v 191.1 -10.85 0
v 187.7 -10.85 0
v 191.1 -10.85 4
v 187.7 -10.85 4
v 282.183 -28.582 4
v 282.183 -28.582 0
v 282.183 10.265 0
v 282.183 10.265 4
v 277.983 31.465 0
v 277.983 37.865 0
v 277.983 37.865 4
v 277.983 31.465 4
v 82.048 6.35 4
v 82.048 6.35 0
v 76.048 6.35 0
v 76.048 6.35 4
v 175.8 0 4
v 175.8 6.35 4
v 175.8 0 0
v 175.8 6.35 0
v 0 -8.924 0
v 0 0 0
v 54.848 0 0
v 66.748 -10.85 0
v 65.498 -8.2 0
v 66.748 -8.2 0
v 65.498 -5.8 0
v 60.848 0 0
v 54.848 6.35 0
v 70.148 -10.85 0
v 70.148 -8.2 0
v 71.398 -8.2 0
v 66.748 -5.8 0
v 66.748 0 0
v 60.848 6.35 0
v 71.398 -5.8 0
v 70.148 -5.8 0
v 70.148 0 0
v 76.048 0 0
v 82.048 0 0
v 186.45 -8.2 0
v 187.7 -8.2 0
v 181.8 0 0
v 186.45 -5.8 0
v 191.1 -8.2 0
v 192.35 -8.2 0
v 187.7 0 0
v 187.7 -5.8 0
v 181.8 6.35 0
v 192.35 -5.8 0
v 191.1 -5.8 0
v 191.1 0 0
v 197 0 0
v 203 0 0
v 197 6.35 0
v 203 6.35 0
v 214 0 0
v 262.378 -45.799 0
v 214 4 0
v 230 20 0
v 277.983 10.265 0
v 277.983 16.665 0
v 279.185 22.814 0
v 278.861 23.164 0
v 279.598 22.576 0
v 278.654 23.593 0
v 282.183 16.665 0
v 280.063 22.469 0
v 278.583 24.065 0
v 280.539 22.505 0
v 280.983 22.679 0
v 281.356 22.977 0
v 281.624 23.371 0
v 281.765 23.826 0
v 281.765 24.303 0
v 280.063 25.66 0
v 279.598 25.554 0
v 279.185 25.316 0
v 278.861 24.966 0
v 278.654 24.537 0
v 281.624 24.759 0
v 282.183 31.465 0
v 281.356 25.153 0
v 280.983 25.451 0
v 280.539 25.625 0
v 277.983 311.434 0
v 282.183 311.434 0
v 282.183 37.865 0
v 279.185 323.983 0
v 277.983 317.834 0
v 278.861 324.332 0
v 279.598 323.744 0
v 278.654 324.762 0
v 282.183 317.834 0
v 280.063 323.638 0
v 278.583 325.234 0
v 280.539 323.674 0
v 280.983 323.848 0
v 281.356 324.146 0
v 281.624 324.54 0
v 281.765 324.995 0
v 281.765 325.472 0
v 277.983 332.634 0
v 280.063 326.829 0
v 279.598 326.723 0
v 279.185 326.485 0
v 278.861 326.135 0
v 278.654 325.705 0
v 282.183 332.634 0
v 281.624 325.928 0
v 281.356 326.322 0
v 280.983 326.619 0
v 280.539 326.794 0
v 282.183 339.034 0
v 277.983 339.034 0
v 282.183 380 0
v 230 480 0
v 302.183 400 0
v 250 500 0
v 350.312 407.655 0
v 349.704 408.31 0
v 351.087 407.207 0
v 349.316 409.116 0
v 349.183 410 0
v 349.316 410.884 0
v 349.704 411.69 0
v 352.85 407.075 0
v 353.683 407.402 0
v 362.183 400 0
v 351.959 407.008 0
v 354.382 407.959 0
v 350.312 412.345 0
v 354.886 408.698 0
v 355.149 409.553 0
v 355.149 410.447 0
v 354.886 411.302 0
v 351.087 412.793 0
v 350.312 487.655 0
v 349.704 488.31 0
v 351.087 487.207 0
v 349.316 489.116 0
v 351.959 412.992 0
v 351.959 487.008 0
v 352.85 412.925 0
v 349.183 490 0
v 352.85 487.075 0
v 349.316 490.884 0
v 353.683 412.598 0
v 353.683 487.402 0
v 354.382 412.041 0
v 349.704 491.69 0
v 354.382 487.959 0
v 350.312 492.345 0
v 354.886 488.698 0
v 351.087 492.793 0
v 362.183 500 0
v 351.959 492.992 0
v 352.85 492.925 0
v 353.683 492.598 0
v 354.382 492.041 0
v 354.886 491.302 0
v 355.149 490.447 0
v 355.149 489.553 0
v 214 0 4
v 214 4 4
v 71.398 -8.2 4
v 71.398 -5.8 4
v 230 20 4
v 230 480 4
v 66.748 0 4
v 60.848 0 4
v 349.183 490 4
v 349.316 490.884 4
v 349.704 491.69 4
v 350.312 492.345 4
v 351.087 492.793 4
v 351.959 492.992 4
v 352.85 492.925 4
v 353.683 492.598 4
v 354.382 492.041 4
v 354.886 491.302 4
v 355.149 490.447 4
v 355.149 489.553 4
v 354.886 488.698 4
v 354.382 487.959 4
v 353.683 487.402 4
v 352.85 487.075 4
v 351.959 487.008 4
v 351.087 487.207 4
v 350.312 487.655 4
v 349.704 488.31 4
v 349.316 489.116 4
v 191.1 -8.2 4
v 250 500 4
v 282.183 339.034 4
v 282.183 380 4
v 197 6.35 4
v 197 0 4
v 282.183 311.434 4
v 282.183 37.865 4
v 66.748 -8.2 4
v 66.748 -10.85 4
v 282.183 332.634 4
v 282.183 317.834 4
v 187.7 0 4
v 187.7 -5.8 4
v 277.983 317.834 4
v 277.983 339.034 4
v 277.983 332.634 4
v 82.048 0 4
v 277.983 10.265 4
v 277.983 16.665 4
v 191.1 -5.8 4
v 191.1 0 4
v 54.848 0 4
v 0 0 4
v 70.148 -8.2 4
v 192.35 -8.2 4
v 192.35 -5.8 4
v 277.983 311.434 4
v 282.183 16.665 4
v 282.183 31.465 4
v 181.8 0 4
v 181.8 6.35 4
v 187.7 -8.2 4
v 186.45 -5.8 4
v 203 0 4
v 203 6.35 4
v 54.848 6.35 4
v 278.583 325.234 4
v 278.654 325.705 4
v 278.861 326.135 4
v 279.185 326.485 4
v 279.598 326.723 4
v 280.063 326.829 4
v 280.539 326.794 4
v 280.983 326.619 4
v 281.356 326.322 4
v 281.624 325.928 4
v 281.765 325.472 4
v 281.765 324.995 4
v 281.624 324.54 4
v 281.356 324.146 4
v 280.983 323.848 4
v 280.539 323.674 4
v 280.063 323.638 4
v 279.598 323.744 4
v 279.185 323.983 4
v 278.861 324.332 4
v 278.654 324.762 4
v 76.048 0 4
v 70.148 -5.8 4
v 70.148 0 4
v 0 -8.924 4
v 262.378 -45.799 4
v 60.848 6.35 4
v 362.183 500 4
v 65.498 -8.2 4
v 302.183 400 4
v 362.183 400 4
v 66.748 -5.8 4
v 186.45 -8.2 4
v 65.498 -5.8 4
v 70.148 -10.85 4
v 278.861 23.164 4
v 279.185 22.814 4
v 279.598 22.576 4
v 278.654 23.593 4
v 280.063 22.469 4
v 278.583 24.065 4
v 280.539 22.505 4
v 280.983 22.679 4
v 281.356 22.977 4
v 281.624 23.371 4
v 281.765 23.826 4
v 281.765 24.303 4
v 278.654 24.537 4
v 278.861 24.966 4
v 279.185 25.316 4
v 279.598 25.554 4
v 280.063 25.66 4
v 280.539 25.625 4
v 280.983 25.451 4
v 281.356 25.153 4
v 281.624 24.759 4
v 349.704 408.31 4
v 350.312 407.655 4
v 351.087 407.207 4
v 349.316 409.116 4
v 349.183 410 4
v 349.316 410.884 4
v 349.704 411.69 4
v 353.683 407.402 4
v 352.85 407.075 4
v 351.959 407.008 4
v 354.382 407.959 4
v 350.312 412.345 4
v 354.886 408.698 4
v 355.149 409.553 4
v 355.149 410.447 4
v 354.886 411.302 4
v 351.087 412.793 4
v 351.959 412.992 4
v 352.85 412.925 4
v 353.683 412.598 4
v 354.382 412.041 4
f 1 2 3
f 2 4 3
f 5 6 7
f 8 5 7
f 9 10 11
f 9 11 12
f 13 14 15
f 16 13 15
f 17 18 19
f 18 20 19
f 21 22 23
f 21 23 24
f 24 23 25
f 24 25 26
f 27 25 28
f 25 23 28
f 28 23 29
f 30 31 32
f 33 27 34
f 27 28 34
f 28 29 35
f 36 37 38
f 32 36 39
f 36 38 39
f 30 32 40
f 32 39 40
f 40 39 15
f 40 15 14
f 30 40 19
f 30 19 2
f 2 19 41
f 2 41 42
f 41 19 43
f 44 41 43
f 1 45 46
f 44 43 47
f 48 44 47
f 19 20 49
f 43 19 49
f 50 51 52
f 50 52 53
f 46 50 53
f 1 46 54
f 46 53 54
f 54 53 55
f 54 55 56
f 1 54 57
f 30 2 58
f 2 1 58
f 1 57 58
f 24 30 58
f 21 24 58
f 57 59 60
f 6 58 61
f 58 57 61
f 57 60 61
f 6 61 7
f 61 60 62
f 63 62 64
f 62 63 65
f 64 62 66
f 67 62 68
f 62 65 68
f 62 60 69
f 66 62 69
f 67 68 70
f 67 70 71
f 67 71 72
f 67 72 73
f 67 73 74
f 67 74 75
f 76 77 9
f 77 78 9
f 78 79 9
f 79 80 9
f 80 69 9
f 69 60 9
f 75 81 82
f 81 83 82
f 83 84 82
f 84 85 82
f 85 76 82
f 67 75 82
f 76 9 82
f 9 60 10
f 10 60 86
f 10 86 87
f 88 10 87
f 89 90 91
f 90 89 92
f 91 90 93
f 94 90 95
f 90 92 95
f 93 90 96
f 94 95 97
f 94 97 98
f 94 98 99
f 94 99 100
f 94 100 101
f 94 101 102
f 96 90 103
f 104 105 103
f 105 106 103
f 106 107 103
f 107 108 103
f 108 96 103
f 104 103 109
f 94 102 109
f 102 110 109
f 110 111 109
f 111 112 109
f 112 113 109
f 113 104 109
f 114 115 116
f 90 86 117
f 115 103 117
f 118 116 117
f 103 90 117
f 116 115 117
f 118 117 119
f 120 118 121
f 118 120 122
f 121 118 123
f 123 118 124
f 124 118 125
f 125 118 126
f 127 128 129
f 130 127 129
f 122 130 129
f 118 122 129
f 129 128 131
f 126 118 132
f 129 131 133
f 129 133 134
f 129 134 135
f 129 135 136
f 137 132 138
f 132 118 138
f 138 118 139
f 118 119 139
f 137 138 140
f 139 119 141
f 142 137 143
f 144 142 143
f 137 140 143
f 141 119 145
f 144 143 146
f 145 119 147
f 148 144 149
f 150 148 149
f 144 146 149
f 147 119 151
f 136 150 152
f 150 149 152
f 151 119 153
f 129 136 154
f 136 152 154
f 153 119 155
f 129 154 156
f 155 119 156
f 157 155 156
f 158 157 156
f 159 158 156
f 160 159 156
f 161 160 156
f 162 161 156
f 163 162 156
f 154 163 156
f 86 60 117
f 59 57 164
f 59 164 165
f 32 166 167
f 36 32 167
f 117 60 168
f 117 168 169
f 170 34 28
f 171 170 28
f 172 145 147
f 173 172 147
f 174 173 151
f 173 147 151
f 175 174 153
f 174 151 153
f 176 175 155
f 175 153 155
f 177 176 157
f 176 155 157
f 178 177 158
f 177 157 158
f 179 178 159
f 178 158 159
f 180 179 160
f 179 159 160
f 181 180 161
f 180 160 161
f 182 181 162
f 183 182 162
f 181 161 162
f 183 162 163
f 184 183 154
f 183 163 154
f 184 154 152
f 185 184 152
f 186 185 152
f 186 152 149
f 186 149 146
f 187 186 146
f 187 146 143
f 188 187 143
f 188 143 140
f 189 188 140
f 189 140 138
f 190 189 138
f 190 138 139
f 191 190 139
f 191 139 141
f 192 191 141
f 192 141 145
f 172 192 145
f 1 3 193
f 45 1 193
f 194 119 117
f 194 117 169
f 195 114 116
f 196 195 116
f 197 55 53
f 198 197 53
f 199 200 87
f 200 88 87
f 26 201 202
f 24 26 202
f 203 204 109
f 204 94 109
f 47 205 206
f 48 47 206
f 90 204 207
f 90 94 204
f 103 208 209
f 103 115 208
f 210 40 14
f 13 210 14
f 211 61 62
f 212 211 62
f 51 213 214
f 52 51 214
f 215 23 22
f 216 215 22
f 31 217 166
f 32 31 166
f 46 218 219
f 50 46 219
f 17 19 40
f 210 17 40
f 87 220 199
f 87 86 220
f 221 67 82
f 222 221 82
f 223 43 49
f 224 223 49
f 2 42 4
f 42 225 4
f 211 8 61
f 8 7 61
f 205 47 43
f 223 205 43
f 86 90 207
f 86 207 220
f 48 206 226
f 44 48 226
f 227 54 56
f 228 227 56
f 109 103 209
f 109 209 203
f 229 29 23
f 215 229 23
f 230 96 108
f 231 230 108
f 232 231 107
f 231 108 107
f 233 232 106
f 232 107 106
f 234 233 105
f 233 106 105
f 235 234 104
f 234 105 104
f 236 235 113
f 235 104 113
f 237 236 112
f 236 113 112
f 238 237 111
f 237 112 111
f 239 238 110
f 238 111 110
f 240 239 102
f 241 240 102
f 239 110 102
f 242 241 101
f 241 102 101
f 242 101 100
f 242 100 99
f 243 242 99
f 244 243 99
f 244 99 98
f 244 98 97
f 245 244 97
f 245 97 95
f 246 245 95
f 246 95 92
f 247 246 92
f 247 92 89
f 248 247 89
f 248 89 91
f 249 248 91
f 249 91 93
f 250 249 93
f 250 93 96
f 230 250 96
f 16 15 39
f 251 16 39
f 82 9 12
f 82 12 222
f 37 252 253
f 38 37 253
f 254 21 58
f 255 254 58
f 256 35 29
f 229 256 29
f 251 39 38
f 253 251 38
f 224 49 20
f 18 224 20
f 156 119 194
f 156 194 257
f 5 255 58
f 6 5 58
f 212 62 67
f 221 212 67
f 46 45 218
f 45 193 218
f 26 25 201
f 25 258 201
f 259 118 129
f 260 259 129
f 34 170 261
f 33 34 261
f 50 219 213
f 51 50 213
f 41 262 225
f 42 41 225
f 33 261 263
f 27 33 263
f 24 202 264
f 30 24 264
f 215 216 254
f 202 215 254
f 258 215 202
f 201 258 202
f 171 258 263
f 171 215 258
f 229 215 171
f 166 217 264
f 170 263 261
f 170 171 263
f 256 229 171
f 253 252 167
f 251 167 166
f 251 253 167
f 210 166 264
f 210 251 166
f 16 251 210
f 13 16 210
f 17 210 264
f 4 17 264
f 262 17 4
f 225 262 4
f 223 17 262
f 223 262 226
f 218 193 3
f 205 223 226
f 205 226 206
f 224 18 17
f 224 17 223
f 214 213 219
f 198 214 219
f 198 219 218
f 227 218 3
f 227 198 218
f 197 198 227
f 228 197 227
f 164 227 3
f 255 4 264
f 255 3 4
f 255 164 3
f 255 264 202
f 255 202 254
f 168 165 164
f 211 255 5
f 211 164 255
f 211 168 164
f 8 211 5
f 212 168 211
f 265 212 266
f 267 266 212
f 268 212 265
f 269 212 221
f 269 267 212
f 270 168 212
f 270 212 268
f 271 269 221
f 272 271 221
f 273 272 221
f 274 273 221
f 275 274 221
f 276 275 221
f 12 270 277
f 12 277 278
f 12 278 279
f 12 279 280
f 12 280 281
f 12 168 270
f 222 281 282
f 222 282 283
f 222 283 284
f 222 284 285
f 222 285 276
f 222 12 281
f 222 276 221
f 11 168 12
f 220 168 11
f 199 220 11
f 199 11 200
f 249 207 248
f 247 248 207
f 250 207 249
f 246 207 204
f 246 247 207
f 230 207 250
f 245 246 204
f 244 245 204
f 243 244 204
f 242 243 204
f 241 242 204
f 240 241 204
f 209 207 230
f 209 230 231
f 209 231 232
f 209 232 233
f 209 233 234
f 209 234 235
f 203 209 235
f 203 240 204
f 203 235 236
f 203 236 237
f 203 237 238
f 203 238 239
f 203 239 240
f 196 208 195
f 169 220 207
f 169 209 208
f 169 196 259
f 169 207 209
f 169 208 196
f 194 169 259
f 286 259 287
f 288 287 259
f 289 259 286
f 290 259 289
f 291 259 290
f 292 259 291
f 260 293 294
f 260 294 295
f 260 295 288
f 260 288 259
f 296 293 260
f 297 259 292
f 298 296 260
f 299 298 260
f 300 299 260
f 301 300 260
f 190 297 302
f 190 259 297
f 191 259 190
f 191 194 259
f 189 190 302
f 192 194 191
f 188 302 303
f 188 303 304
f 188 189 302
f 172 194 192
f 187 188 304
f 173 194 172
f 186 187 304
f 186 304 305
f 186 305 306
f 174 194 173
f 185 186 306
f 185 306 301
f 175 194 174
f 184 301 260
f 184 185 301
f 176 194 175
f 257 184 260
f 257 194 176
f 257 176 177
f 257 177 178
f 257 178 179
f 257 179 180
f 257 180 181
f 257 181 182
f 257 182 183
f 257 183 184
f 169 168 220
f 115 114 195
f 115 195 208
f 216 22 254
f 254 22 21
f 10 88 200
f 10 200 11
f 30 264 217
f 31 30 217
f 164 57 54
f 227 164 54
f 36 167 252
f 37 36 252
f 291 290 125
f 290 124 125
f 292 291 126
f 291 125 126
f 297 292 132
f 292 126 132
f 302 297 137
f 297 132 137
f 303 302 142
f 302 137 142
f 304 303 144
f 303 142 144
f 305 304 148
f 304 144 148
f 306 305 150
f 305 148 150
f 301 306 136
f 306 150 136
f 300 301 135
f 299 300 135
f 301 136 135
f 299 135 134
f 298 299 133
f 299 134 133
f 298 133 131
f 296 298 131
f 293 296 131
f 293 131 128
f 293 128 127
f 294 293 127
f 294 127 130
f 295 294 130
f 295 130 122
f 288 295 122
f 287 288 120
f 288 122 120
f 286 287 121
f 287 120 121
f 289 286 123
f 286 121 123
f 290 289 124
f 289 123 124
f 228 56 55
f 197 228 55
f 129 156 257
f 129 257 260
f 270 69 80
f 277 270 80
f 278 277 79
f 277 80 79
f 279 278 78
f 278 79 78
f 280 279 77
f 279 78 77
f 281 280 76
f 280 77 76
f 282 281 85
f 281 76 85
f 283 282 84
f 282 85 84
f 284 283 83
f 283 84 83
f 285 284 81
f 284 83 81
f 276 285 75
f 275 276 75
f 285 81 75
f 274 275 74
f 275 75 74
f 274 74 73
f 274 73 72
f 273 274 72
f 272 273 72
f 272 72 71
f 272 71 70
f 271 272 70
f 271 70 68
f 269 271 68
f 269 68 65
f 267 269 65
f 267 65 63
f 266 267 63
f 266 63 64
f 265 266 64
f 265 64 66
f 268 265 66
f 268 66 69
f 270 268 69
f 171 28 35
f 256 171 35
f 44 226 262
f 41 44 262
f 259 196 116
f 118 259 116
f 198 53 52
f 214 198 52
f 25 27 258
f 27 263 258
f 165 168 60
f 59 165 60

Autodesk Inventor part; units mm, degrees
ref_plane "YZ Plane" through (0, 0, 0) normal (1, 0, 0) x (0, 1, 0)
ref_plane "XZ Plane" through (0, 0, 0) normal (0, 1, 0) x (-1, 0, 0)
ref_plane "XY Plane" through (0, 0, 0) normal (0, 0, 1) x (1, 0, 0)
sketch "Sketch1" plane through (0, 0, 0) normal (0, 0, 1) x (1, 0, 0)
  line L0 (230, 0) -> (0, 0) projected
  line L1 (0, 0) -> (0, -8.9243)
  line L2 (0, -8.9243) -> (282.1829, -48.5825)
  line L3 (282.1829, -48.5825) -> (282.1829, 400)
  line L4 (230, 0) -> (230, 500)
  line L5 (282.1829, 400) -> (362.1829, 400)
  line L6 (230, 500) -> (362.1829, 500)
  line L7 (362.1829, 500) -> (362.1829, 400)
  dimension "d0" = 400
  dimension "d1" = 8
  dimension "d10" = 80
  dimension "d11" = 100
extrude "Extrusion1" add sketch "Sketch1" along normal blind 4
chamfer "Chamfer1" distance 20 angle 45 2 edges at (230, 500, 2) (282.1829, 400, 2)
chamfer "Chamfer2" distance 20 angle 45 2 edges at (230, 0, 2) (282.1829, -48.5825, 2)
sketch "Sketch2" plane through (0, 0, 0) normal (0, 0, -1) x (-1, 0, 0)
  point P0 (0, 0)
sketch "Sketch3" plane through (0, 0, 0) normal (0, 0, -1) x (-1, 0, 0)
  point P0 (0, 0)
sketch "Sketch4" plane through (0, 0, 0) normal (0, 0, -1) x (-1, 0, 0)
  point P0 (0, 0)
sketch "Sketch5" plane through (0, 0, 0) normal (0, 0, -1) x (-1, 0, 0)
  line L0 (-278.1829, 10.465) -> (-278.1829, 16.465) construction
  line L1 (-282.1829, 16.465) -> (-278.1829, 16.465) construction
  line L2 (-282.1829, 10.465) -> (-282.1829, 16.465) construction
  line L3 (-282.1829, 10.465) -> (-278.1829, 10.465) construction
  line L4 (-278.1829, 31.665) -> (-278.1829, 37.665) construction
  line L5 (-282.1829, 37.665) -> (-278.1829, 37.665) construction
  line L6 (-282.1829, 31.665) -> (-282.1829, 37.665) construction
  line L7 (-282.1829, 31.665) -> (-278.1829, 31.665) construction
  line L8 (-278.1829, 332.8339) -> (-278.1829, 338.8339) construction
  line L9 (-282.1829, 338.8339) -> (-278.1829, 338.8339) construction
  line L10 (-282.1829, 332.8339) -> (-282.1829, 338.8339) construction
  line L11 (-282.1829, 332.8339) -> (-278.1829, 332.8339) construction
  line L12 (-278.1829, 311.6339) -> (-278.1829, 317.6339) construction
  line L13 (-282.1829, 317.6339) -> (-278.1829, 317.6339) construction
  line L14 (-282.1829, 311.6339) -> (-282.1829, 317.6339) construction
  line L15 (-282.1829, 311.6339) -> (-278.1829, 311.6339) construction
  line L16 (-277.9829, 339.0339) -> (-277.9829, 332.6339)
  line L17 (-277.9829, 332.6339) -> (-282.3829, 332.6339)
  line L18 (-282.3829, 332.6339) -> (-282.3829, 339.0339)
  line L19 (-282.3829, 339.0339) -> (-277.9829, 339.0339)
  line L20 (-277.9829, 317.8339) -> (-277.9829, 311.4339)
  line L21 (-277.9829, 311.4339) -> (-282.3829, 311.4339)
  line L22 (-282.3829, 311.4339) -> (-282.3829, 317.8339)
  line L23 (-282.3829, 317.8339) -> (-277.9829, 317.8339)
  line L24 (-277.9829, 37.865) -> (-277.9829, 31.465)
  line L25 (-277.9829, 31.465) -> (-282.3829, 31.465)
  line L26 (-282.3829, 31.465) -> (-282.3829, 37.865)
  line L27 (-282.3829, 37.865) -> (-277.9829, 37.865)
  line L28 (-277.9829, 10.265) -> (-277.9829, 16.665)
  line L29 (-277.9829, 16.665) -> (-282.3829, 16.665)
  line L30 (-282.3829, 16.665) -> (-282.3829, 10.265)
  line L31 (-282.3829, 10.265) -> (-277.9829, 10.265)
  point P0 (0, 0)
  dimension "d24" = 0.2
  dimension "d25" = 0.2
  dimension "d26" = 0.2
  dimension "d27" = 0.2
extrude "Extrusion2" cut sketch "Sketch5" against normal blind 25.4
sketch "Sketch6" plane through (0, 0, 0) normal (0, 0, -1) x (-1, 0, 0)
  line L0 (-278.1829, 25.5649) -> (-278.1829, 22.5649) projected
  line L1 (-282.1829, 25.5649) -> (-278.1829, 25.5649) projected
  line L2 (-282.1829, 22.5649) -> (-282.1829, 25.5649) projected
  line L3 (-282.1829, 22.5649) -> (-278.1829, 22.5649) projected
  line L4 (-278.1829, 326.7338) -> (-278.1829, 323.7338) projected
  line L5 (-282.1829, 326.7338) -> (-278.1829, 326.7338) projected
  line L6 (-282.1829, 323.7338) -> (-282.1829, 326.7338) projected
  line L7 (-282.1829, 323.7338) -> (-278.1829, 323.7338) projected
  circle A0 centre (-280.1829, 325.2338) radius 1.6
  circle A1 centre (-280.1829, 24.0649) radius 1.6
  point P0 (0, 0)
  dimension "d14" = 3.2
  dimension "d15" = 3.2
extrude "Extrusion3" cut sketch "Sketch6" against normal through all contours A1 L3 L1 | L1 A1 | A1 L3 | A0 L7 L5 | L5 A0 | A0 L7
sketch "Sketch7" plane through (0, 0, 0) normal (0, 0, -1) x (-1, 0, 0)
  line L0 (-230, 4.0001) -> (-214.0001, 4.0001) projected
  line L1 (-210, 0) -> (-230, 20) projected
  line L2 (-210, 0) -> (-214.0001, 0)
  line L3 (-214.0001, 0) -> (-214.0001, 4.0001)
  line L4 (-214.0001, 4.0001) -> (-210, 4.0001)
  line L5 (-210, 4.0001) -> (-210, 0)
  point P0 (0, 0)
extrude "Extrusion4" cut sketch "Sketch7" against normal blind 25.4
sketch "Sketch8" plane through (0, 0, 0) normal (0, 0, -1) x (-1, 0, 0)
  line L0 (-209.8759, -14.6536) -> (-209.8759, 0) projected
  line L1 (-168.9242, -14.6536) -> (-209.8759, -14.6536) projected
  line L2 (-168.9242, 0) -> (-168.9242, -14.6536) projected
  line L3 (-175.8001, 0) -> (-168.9242, 0) projected
  line L4 (-175.8001, 6.35) -> (-175.8001, 0) projected
  line L5 (-181.8001, 6.35) -> (-175.8001, 6.35) projected
  line L6 (-181.8001, 0) -> (-181.8001, 6.35) projected
  line L7 (-187.9001, 0) -> (-181.8001, 0) projected
  line L8 (-187.9001, -6) -> (-187.9001, 0) projected
  line L9 (-186.6501, -6) -> (-187.9001, -6) projected
  line L10 (-186.6501, -8) -> (-186.6501, -6) projected
  line L11 (-187.9001, -8) -> (-186.6501, -8) projected
  line L12 (-187.9001, -10.65) -> (-187.9001, -8) projected
  line L13 (-190.9, -10.65) -> (-187.9001, -10.65) projected
  line L14 (-190.9, -8) -> (-190.9, -10.65) projected
  line L15 (-192.15, -8) -> (-190.9, -8) projected
  line L16 (-192.15, -6) -> (-192.15, -8) projected
  line L17 (-190.9, -6) -> (-192.15, -6) projected
  line L18 (-190.9, 0) -> (-190.9, -6) projected
  line L19 (-197, 0) -> (-190.9, 0) projected
  line L20 (-197, 6.35) -> (-197, 0) projected
  line L21 (-203.0001, 6.35) -> (-197, 6.35) projected
  line L22 (-203.0001, 0) -> (-203.0001, 6.35) projected
  line L23 (-209.8759, 0) -> (-203.0001, 0) projected
  line L24 (-88.9242, -14.6536) -> (-88.9242, 0) projected
  line L25 (-47.9725, -14.6536) -> (-88.9242, -14.6536) projected
  line L26 (-47.9725, 0) -> (-47.9725, -14.6536) projected
  line L27 (-54.8484, 0) -> (-47.9725, 0) projected
  line L28 (-54.8484, 6.35) -> (-54.8484, 0) projected
  line L29 (-60.8484, 6.35) -> (-54.8484, 6.35) projected
  line L30 (-60.8484, 0) -> (-60.8484, 6.35) projected
  line L31 (-66.9484, 0) -> (-60.8484, 0) projected
  line L32 (-66.9484, -6) -> (-66.9484, 0) projected
  line L33 (-65.6984, -6) -> (-66.9484, -6) projected
  line L34 (-65.6984, -8) -> (-65.6984, -6) projected
  line L35 (-66.9484, -8) -> (-65.6984, -8) projected
  line L36 (-66.9484, -10.65) -> (-66.9484, -8) projected
  line L37 (-69.9484, -10.65) -> (-66.9484, -10.65) projected
  line L38 (-69.9484, -8) -> (-69.9484, -10.65) projected
  line L39 (-71.1984, -8) -> (-69.9484, -8) projected
  line L40 (-71.1984, -6) -> (-71.1984, -8) projected
  line L41 (-69.9484, -6) -> (-71.1984, -6) projected
  line L42 (-69.9484, 0) -> (-69.9484, -6) projected
  line L43 (-76.0484, 0) -> (-69.9484, 0) projected
  line L44 (-76.0484, 6.35) -> (-76.0484, 0) projected
  line L45 (-82.0484, 6.35) -> (-76.0484, 6.35) projected
  line L46 (-82.0484, 0) -> (-82.0484, 6.35) projected
  line L47 (-88.9242, 0) -> (-82.0484, 0) projected
  point P0 (0, 0)
extrude "Extrusion5" add sketch "Sketch8" against normal up to surface (4 mm away)
sketch "Sketch10" plane through (0, 0, 0) normal (0, 0, -1) x (-1, 0, 0)
  line L0 (-209.8759, -14.6536) -> (-209.8759, 0) projected
  line L1 (-168.9242, -14.6536) -> (-209.8759, -14.6536) projected
  line L2 (-168.9242, 0) -> (-168.9242, -14.6536) projected
  line L3 (-175.8001, 0) -> (-168.9242, 0) projected
  line L4 (-175.8001, 6.35) -> (-175.8001, 0) projected
  line L5 (-181.8001, 6.35) -> (-175.8001, 6.35) projected
  line L6 (-181.8001, 0) -> (-181.8001, 6.35) projected
  line L7 (-187.9001, 0) -> (-181.8001, 0) projected
  line L8 (-187.9001, -6) -> (-187.9001, 0) projected
  line L9 (-186.6501, -6) -> (-187.9001, -6) projected
  line L10 (-186.6501, -8) -> (-186.6501, -6) projected
  line L11 (-187.9001, -8) -> (-186.6501, -8) projected
  line L12 (-187.9001, -10.65) -> (-187.9001, -8) projected
  line L13 (-190.9, -10.65) -> (-187.9001, -10.65) projected
  line L14 (-190.9, -8) -> (-190.9, -10.65) projected
  line L15 (-192.15, -8) -> (-190.9, -8) projected
  line L16 (-192.15, -6) -> (-192.15, -8) projected
  line L17 (-190.9, -6) -> (-192.15, -6) projected
  line L18 (-190.9, 0) -> (-190.9, -6) projected
  line L19 (-197, 0) -> (-190.9, 0) projected
  line L20 (-197, 6.35) -> (-197, 0) projected
  line L21 (-203.0001, 6.35) -> (-197, 6.35) projected
  line L22 (-203.0001, 0) -> (-203.0001, 6.35) projected
  line L23 (-209.8759, 0) -> (-203.0001, 0) projected
  line L24 (-88.9242, -14.6536) -> (-88.9242, 0) projected
  line L25 (-47.9725, -14.6536) -> (-88.9242, -14.6536) projected
  line L26 (-47.9725, 0) -> (-47.9725, -14.6536) projected
  line L27 (-54.8484, 0) -> (-47.9725, 0) projected
  line L28 (-54.8484, 6.35) -> (-54.8484, 0) projected
  line L29 (-60.8484, 6.35) -> (-54.8484, 6.35) projected
  line L30 (-60.8484, 0) -> (-60.8484, 6.35) projected
  line L31 (-66.9484, 0) -> (-60.8484, 0) projected
  line L32 (-66.9484, -6) -> (-66.9484, 0) projected
  line L33 (-65.6984, -6) -> (-66.9484, -6) projected
  line L34 (-65.6984, -8) -> (-65.6984, -6) projected
  line L35 (-66.9484, -8) -> (-65.6984, -8) projected
  line L36 (-66.9484, -10.65) -> (-66.9484, -8) projected
  line L37 (-69.9484, -10.65) -> (-66.9484, -10.65) projected
  line L38 (-69.9484, -8) -> (-69.9484, -10.65) projected
  line L39 (-71.1984, -8) -> (-69.9484, -8) projected
  line L40 (-71.1984, -6) -> (-71.1984, -8) projected
  line L41 (-69.9484, -6) -> (-71.1984, -6) projected
  line L42 (-69.9484, 0) -> (-69.9484, -6) projected
  line L43 (-76.0484, 0) -> (-69.9484, 0) projected
  line L44 (-76.0484, 6.35) -> (-76.0484, 0) projected
  line L45 (-82.0484, 6.35) -> (-76.0484, 6.35) projected
  line L46 (-82.0484, 0) -> (-82.0484, 6.35) projected
  line L47 (-88.9242, 0) -> (-82.0484, 0) projected
  line L48 (-190.9, 0) -> (-187.9001, 0)
  line L49 (-197, 0) -> (-181.8001, 0) projected
  line L50 (-69.9484, 0) -> (-66.9484, 0)
  line L51 (-76.0484, 0) -> (-60.8484, 0) projected
  point P0 (0, 0)
extrude "Extrusion6" cut sketch "Sketch10" against normal blind 25.4 contours L48 L8 L9 L10 L11 L12 L13 L14 L15 L16 L17 L18 | L50 L32 L33 L34 L35 L36 L37 L38 L39 L40 L41 L42
sketch "Sketch11" plane through (0, 0, 0) normal (0, 0, -1) x (-1, 0, 0)
  line L0 (-342.1829, 500) -> (-342.1829, 400) projected
  circle A0 centre (-352.1829, 490) radius 3
  circle A1 centre (-352.1829, 410) radius 3
  line L1 (-362.1829, 500) -> (-362.1829, 400) projected
  line L2 (-250, 500) -> (-362.1829, 500) projected
  line L3 (-362.1829, 400) -> (-302.1829, 400) projected
  point P0 (0, 0)
  dimension "d28" = 6
  dimension "d29" = 6
  dimension "d30" = 10
  dimension "d31" = 10
  dimension "d32" = 10
  dimension "d33" = 10
extrude "Extrusion7" cut sketch "Sketch11" against normal blind 25.4 contours A0 | A1
sketch "Sketch12" plane through (0, 0, 4) normal (0, 0, 1) x (1, 0, 0)
  circle A0 centre (352.1829, 490) radius 3 projected
  circle A1 centre (352.1829, 410) radius 3 projected
  line L0 (187.9001, -6) -> (187.9001, 0) projected
  line L1 (187.9001, 0) -> (181.8001, 0) projected
  line L2 (181.8001, 6.35) -> (181.8001, 0) projected
  line L3 (175.8001, 6.35) -> (181.8001, 6.35) projected
  line L4 (175.8001, 0) -> (175.8001, 6.35) projected
  line L5 (175.8001, 0) -> (82.0484, 0) projected
  line L6 (82.0484, 6.35) -> (82.0484, 0) projected
  line L7 (76.0484, 6.35) -> (82.0484, 6.35) projected
  line L8 (76.0484, 0) -> (76.0484, 6.35) projected
  line L9 (76.0484, 0) -> (69.9484, 0) projected
  line L10 (69.9484, 0) -> (69.9484, -6) projected
  line L11 (69.9484, -6) -> (71.1984, -6) projected
  line L12 (71.1984, -6) -> (71.1984, -8) projected
  line L13 (71.1984, -8) -> (69.9484, -8) projected
  line L14 (69.9484, -8) -> (69.9484, -10.65) projected
  line L15 (69.9484, -10.65) -> (66.9484, -10.65) projected
  line L16 (66.9484, -10.65) -> (66.9484, -8) projected
  line L17 (66.9484, -8) -> (65.6984, -8) projected
  line L18 (65.6984, -8) -> (65.6984, -6) projected
  line L19 (65.6984, -6) -> (66.9484, -6) projected
  line L20 (66.9484, -6) -> (66.9484, 0) projected
  line L21 (66.9484, 0) -> (60.8484, 0) projected
  line L22 (60.8484, 6.35) -> (60.8484, 0) projected
  line L23 (54.8484, 6.35) -> (60.8484, 6.35) projected
  line L24 (54.8484, 0) -> (54.8484, 6.35) projected
  line L25 (54.8484, 0) -> (0, 0) projected
  line L26 (0, 0) -> (0, -8.9243) projected
  line L27 (0, -8.9243) -> (262.3776, -45.7991) projected
  line L28 (282.1829, -28.5825) -> (262.3776, -45.7991) projected
  line L29 (282.1829, -28.5825) -> (282.1829, 10.265) projected
  line L30 (282.1829, 10.265) -> (277.9829, 10.265) projected
  line L31 (277.9829, 10.265) -> (277.9829, 16.665) projected
  line L32 (277.9829, 16.665) -> (282.1829, 16.665) projected
  line L33 (282.1829, 16.665) -> (282.1829, 31.465) projected
  line L34 (282.1829, 31.465) -> (277.9829, 31.465) projected
  line L35 (277.9829, 31.465) -> (277.9829, 37.865) projected
  line L36 (277.9829, 37.865) -> (282.1829, 37.865) projected
  line L37 (282.1829, 37.865) -> (282.1829, 311.4339) projected
  line L38 (282.1829, 311.4339) -> (277.9829, 311.4339) projected
  line L39 (277.9829, 311.4339) -> (277.9829, 317.8339) projected
  line L40 (277.9829, 317.8339) -> (282.1829, 317.8339) projected
  line L41 (282.1829, 317.8339) -> (282.1829, 332.6339) projected
  line L42 (282.1829, 332.6339) -> (277.9829, 332.6339) projected
  line L43 (277.9829, 332.6339) -> (277.9829, 339.0339) projected
  line L44 (277.9829, 339.0339) -> (282.1829, 339.0339) projected
  line L45 (282.1829, 339.0339) -> (282.1829, 380) projected
  line L46 (302.1829, 400) -> (282.1829, 380) projected
  line L47 (302.1829, 400) -> (362.1829, 400) projected
  line L48 (362.1829, 400) -> (362.1829, 500) projected
  line L49 (362.1829, 500) -> (250, 500) projected
  line L50 (230, 480) -> (250, 500) projected
  line L51 (230, 480) -> (230, 20) projected
  line L52 (214.0001, 4.0001) -> (230, 20) projected
  line L53 (214.0001, 4.0001) -> (214.0001, 0) projected
  line L54 (214.0001, 0) -> (203.0001, 0) projected
  line L55 (203.0001, 6.35) -> (203.0001, 0) projected
  line L56 (197, 6.35) -> (203.0001, 6.35) projected
  line L57 (197, 0) -> (197, 6.35) projected
  line L58 (197, 0) -> (190.9, 0) projected
  line L59 (190.9, 0) -> (190.9, -6) projected
  line L60 (190.9, -6) -> (192.15, -6) projected
  line L61 (192.15, -6) -> (192.15, -8) projected
  line L62 (192.15, -8) -> (190.9, -8) projected
  line L63 (190.9, -8) -> (190.9, -10.65) projected
  line L64 (190.9, -10.65) -> (187.9001, -10.65) projected
  line L65 (187.9001, -10.65) -> (187.9001, -8) projected
  line L66 (187.9001, -8) -> (186.6501, -8) projected
  line L67 (186.6501, -8) -> (186.6501, -6) projected
  line L68 (186.6501, -6) -> (187.9001, -6) projected
  circle A2 centre (280.1829, 24.0649) radius 1.6 projected
  circle A3 centre (280.1829, 325.2338) radius 1.6 projected
  line L69 (66.7484, -0.2) -> (66.7484, -5.8)
  line L70 (66.7484, -5.8) -> (65.4984, -5.8)
  line L71 (65.4984, -5.8) -> (65.4984, -8.2)
  line L72 (65.4984, -8.2) -> (66.7484, -8.2)
  line L73 (66.7484, -8.2) -> (66.7484, -10.85)
  line L74 (66.7484, -10.85) -> (70.1484, -10.85)
  line L75 (70.1484, -10.85) -> (70.1484, -8.2)
  line L76 (70.1484, -8.2) -> (71.3984, -8.2)
  line L77 (71.3984, -8.2) -> (71.3984, -5.8)
  line L78 (71.3984, -5.8) -> (70.1484, -5.8)
  line L79 (70.1484, -5.8) -> (70.1484, -0.2)
  line L80 (76.2484, -0.2) -> (76.2484, 6.15)
  line L81 (76.2484, 6.15) -> (81.8484, 6.15)
  line L82 (81.8484, 6.15) -> (81.8484, -0.2)
  line L83 (81.8484, -0.2) -> (176.0001, -0.2)
  line L84 (176.0001, -0.2) -> (176.0001, 6.15)
  line L85 (176.0001, 6.15) -> (181.6001, 6.15)
  line L86 (181.6001, 6.15) -> (181.6001, -0.2)
  line L87 (187.7001, -0.2) -> (187.7001, -5.8)
  line L88 (187.7001, -5.8) -> (186.4501, -5.8)
  line L89 (186.4501, -5.8) -> (186.4501, -8.2)
  line L90 (186.4501, -8.2) -> (187.7001, -8.2)
  line L91 (187.7001, -8.2) -> (187.7001, -10.85)
  line L92 (187.7001, -10.85) -> (191.1, -10.85)
  line L93 (191.1, -10.85) -> (191.1, -8.2)
  line L94 (191.1, -8.2) -> (192.35, -8.2)
  line L95 (192.35, -8.2) -> (192.35, -5.8)
  line L96 (192.35, -5.8) -> (191.1, -5.8)
  line L97 (191.1, -5.8) -> (191.1, -0.2)
  line L98 (197.2, -0.2) -> (197.2, 6.15)
  line L99 (197.2, 6.15) -> (202.8001, 6.15)
  line L100 (202.8001, 6.15) -> (202.8001, -0.2)
  line L101 (202.8001, -0.2) -> (214.2001, -0.2)
  line L102 (214.2001, -0.2) -> (214.2001, 3.9172)
  line L103 (214.2001, 3.9172) -> (230.2, 19.9172)
  line L104 (230.2, 19.9172) -> (230.2, 479.9172)
  line L105 (230.2, 479.9172) -> (250.0828, 499.8)
  line L106 (250.0828, 499.8) -> (361.9829, 499.8)
  line L107 (361.9829, 499.8) -> (361.9829, 400.2)
  line L108 (361.9829, 400.2) -> (302.1001, 400.2)
  line L109 (302.1001, 400.2) -> (281.9829, 380.0828)
  line L110 (281.9829, 380.0828) -> (281.9829, 339.2339)
  line L111 (281.9829, 339.2339) -> (277.7829, 339.2339)
  line L112 (277.7829, 339.2339) -> (277.7829, 332.4339)
  line L113 (277.7829, 332.4339) -> (281.9829, 332.4339)
  line L114 (281.9829, 332.4339) -> (281.9829, 318.0339)
  line L115 (281.9829, 318.0339) -> (277.7829, 318.0339)
  line L116 (277.7829, 318.0339) -> (277.7829, 311.2339)
  line L117 (277.7829, 311.2339) -> (281.9829, 311.2339)
  line L118 (281.9829, 311.2339) -> (281.9829, 38.065)
  line L119 (281.9829, 38.065) -> (277.7829, 38.065)
  line L120 (277.7829, 38.065) -> (277.7829, 31.265)
  line L121 (277.7829, 31.265) -> (281.9829, 31.265)
  line L122 (281.9829, 31.265) -> (281.9829, 16.865)
  line L123 (281.9829, 16.865) -> (277.7829, 16.865)
  line L124 (277.7829, 16.865) -> (277.7829, 10.065)
  line L125 (277.7829, 10.065) -> (281.9829, 10.065)
  line L126 (281.9829, 10.065) -> (281.9829, -28.4914)
  line L127 (281.9829, -28.4914) -> (262.3152, -45.5883)
  line L128 (262.3152, -45.5883) -> (0.2, -8.7504)
  line L129 (0.2, -8.7504) -> (0.2, -0.2)
  line L130 (0.2, -0.2) -> (55.0484, -0.2)
  line L131 (55.0484, -0.2) -> (55.0484, 6.15)
  line L132 (55.0484, 6.15) -> (60.6484, 6.15)
  line L133 (60.6484, 6.15) -> (60.6484, -0.2)
  line L134 (69.9484, 0) -> (76.0484, 0) projected
  line L135 (70.1484, -0.2) -> (70.1484, 0)
  line L136 (70.1484, 0) -> (66.7484, 0)
  line L137 (66.7484, 0) -> (66.7484, -0.2)
  line L138 (190.9, 0) -> (197, 0) projected
  line L139 (191.1, -0.2) -> (191.1, 0)
  line L140 (191.1, 0) -> (187.7001, 0)
  line L141 (187.7001, 0) -> (187.7001, -0.2)
  line L142 (181.6001, -0.2) -> (181.8001, -0.2)
  line L143 (197, -0.2) -> (197.2, -0.2)
  dimension "d36" = 0.2
extrude "Extrusion8" cut sketch "Sketch12" against normal blind 25.4 contours L68 L67 L66 L65 L64 L63 L62 L61 L60 L59 L58 L139 L97 L96 L95 L94 L93 L92 L91 L90 L89 L88 L87 L141 L1 L0 | L0 L140 L59 L60 L61 L62 L63 L64 L65 L66 L67 L68 | L135 L79 L78 L77 L76 L75 L74 L73 L72 L71 L70 L69 L137 L21 L20 L19 L18 L17 L16 L15 L14 L13 L12 L11 L10 L9 | L10 L11 L12 L13 L14 L15 L16 L17 L18 L19 L20 L136
properties part number "Z stage_side"
